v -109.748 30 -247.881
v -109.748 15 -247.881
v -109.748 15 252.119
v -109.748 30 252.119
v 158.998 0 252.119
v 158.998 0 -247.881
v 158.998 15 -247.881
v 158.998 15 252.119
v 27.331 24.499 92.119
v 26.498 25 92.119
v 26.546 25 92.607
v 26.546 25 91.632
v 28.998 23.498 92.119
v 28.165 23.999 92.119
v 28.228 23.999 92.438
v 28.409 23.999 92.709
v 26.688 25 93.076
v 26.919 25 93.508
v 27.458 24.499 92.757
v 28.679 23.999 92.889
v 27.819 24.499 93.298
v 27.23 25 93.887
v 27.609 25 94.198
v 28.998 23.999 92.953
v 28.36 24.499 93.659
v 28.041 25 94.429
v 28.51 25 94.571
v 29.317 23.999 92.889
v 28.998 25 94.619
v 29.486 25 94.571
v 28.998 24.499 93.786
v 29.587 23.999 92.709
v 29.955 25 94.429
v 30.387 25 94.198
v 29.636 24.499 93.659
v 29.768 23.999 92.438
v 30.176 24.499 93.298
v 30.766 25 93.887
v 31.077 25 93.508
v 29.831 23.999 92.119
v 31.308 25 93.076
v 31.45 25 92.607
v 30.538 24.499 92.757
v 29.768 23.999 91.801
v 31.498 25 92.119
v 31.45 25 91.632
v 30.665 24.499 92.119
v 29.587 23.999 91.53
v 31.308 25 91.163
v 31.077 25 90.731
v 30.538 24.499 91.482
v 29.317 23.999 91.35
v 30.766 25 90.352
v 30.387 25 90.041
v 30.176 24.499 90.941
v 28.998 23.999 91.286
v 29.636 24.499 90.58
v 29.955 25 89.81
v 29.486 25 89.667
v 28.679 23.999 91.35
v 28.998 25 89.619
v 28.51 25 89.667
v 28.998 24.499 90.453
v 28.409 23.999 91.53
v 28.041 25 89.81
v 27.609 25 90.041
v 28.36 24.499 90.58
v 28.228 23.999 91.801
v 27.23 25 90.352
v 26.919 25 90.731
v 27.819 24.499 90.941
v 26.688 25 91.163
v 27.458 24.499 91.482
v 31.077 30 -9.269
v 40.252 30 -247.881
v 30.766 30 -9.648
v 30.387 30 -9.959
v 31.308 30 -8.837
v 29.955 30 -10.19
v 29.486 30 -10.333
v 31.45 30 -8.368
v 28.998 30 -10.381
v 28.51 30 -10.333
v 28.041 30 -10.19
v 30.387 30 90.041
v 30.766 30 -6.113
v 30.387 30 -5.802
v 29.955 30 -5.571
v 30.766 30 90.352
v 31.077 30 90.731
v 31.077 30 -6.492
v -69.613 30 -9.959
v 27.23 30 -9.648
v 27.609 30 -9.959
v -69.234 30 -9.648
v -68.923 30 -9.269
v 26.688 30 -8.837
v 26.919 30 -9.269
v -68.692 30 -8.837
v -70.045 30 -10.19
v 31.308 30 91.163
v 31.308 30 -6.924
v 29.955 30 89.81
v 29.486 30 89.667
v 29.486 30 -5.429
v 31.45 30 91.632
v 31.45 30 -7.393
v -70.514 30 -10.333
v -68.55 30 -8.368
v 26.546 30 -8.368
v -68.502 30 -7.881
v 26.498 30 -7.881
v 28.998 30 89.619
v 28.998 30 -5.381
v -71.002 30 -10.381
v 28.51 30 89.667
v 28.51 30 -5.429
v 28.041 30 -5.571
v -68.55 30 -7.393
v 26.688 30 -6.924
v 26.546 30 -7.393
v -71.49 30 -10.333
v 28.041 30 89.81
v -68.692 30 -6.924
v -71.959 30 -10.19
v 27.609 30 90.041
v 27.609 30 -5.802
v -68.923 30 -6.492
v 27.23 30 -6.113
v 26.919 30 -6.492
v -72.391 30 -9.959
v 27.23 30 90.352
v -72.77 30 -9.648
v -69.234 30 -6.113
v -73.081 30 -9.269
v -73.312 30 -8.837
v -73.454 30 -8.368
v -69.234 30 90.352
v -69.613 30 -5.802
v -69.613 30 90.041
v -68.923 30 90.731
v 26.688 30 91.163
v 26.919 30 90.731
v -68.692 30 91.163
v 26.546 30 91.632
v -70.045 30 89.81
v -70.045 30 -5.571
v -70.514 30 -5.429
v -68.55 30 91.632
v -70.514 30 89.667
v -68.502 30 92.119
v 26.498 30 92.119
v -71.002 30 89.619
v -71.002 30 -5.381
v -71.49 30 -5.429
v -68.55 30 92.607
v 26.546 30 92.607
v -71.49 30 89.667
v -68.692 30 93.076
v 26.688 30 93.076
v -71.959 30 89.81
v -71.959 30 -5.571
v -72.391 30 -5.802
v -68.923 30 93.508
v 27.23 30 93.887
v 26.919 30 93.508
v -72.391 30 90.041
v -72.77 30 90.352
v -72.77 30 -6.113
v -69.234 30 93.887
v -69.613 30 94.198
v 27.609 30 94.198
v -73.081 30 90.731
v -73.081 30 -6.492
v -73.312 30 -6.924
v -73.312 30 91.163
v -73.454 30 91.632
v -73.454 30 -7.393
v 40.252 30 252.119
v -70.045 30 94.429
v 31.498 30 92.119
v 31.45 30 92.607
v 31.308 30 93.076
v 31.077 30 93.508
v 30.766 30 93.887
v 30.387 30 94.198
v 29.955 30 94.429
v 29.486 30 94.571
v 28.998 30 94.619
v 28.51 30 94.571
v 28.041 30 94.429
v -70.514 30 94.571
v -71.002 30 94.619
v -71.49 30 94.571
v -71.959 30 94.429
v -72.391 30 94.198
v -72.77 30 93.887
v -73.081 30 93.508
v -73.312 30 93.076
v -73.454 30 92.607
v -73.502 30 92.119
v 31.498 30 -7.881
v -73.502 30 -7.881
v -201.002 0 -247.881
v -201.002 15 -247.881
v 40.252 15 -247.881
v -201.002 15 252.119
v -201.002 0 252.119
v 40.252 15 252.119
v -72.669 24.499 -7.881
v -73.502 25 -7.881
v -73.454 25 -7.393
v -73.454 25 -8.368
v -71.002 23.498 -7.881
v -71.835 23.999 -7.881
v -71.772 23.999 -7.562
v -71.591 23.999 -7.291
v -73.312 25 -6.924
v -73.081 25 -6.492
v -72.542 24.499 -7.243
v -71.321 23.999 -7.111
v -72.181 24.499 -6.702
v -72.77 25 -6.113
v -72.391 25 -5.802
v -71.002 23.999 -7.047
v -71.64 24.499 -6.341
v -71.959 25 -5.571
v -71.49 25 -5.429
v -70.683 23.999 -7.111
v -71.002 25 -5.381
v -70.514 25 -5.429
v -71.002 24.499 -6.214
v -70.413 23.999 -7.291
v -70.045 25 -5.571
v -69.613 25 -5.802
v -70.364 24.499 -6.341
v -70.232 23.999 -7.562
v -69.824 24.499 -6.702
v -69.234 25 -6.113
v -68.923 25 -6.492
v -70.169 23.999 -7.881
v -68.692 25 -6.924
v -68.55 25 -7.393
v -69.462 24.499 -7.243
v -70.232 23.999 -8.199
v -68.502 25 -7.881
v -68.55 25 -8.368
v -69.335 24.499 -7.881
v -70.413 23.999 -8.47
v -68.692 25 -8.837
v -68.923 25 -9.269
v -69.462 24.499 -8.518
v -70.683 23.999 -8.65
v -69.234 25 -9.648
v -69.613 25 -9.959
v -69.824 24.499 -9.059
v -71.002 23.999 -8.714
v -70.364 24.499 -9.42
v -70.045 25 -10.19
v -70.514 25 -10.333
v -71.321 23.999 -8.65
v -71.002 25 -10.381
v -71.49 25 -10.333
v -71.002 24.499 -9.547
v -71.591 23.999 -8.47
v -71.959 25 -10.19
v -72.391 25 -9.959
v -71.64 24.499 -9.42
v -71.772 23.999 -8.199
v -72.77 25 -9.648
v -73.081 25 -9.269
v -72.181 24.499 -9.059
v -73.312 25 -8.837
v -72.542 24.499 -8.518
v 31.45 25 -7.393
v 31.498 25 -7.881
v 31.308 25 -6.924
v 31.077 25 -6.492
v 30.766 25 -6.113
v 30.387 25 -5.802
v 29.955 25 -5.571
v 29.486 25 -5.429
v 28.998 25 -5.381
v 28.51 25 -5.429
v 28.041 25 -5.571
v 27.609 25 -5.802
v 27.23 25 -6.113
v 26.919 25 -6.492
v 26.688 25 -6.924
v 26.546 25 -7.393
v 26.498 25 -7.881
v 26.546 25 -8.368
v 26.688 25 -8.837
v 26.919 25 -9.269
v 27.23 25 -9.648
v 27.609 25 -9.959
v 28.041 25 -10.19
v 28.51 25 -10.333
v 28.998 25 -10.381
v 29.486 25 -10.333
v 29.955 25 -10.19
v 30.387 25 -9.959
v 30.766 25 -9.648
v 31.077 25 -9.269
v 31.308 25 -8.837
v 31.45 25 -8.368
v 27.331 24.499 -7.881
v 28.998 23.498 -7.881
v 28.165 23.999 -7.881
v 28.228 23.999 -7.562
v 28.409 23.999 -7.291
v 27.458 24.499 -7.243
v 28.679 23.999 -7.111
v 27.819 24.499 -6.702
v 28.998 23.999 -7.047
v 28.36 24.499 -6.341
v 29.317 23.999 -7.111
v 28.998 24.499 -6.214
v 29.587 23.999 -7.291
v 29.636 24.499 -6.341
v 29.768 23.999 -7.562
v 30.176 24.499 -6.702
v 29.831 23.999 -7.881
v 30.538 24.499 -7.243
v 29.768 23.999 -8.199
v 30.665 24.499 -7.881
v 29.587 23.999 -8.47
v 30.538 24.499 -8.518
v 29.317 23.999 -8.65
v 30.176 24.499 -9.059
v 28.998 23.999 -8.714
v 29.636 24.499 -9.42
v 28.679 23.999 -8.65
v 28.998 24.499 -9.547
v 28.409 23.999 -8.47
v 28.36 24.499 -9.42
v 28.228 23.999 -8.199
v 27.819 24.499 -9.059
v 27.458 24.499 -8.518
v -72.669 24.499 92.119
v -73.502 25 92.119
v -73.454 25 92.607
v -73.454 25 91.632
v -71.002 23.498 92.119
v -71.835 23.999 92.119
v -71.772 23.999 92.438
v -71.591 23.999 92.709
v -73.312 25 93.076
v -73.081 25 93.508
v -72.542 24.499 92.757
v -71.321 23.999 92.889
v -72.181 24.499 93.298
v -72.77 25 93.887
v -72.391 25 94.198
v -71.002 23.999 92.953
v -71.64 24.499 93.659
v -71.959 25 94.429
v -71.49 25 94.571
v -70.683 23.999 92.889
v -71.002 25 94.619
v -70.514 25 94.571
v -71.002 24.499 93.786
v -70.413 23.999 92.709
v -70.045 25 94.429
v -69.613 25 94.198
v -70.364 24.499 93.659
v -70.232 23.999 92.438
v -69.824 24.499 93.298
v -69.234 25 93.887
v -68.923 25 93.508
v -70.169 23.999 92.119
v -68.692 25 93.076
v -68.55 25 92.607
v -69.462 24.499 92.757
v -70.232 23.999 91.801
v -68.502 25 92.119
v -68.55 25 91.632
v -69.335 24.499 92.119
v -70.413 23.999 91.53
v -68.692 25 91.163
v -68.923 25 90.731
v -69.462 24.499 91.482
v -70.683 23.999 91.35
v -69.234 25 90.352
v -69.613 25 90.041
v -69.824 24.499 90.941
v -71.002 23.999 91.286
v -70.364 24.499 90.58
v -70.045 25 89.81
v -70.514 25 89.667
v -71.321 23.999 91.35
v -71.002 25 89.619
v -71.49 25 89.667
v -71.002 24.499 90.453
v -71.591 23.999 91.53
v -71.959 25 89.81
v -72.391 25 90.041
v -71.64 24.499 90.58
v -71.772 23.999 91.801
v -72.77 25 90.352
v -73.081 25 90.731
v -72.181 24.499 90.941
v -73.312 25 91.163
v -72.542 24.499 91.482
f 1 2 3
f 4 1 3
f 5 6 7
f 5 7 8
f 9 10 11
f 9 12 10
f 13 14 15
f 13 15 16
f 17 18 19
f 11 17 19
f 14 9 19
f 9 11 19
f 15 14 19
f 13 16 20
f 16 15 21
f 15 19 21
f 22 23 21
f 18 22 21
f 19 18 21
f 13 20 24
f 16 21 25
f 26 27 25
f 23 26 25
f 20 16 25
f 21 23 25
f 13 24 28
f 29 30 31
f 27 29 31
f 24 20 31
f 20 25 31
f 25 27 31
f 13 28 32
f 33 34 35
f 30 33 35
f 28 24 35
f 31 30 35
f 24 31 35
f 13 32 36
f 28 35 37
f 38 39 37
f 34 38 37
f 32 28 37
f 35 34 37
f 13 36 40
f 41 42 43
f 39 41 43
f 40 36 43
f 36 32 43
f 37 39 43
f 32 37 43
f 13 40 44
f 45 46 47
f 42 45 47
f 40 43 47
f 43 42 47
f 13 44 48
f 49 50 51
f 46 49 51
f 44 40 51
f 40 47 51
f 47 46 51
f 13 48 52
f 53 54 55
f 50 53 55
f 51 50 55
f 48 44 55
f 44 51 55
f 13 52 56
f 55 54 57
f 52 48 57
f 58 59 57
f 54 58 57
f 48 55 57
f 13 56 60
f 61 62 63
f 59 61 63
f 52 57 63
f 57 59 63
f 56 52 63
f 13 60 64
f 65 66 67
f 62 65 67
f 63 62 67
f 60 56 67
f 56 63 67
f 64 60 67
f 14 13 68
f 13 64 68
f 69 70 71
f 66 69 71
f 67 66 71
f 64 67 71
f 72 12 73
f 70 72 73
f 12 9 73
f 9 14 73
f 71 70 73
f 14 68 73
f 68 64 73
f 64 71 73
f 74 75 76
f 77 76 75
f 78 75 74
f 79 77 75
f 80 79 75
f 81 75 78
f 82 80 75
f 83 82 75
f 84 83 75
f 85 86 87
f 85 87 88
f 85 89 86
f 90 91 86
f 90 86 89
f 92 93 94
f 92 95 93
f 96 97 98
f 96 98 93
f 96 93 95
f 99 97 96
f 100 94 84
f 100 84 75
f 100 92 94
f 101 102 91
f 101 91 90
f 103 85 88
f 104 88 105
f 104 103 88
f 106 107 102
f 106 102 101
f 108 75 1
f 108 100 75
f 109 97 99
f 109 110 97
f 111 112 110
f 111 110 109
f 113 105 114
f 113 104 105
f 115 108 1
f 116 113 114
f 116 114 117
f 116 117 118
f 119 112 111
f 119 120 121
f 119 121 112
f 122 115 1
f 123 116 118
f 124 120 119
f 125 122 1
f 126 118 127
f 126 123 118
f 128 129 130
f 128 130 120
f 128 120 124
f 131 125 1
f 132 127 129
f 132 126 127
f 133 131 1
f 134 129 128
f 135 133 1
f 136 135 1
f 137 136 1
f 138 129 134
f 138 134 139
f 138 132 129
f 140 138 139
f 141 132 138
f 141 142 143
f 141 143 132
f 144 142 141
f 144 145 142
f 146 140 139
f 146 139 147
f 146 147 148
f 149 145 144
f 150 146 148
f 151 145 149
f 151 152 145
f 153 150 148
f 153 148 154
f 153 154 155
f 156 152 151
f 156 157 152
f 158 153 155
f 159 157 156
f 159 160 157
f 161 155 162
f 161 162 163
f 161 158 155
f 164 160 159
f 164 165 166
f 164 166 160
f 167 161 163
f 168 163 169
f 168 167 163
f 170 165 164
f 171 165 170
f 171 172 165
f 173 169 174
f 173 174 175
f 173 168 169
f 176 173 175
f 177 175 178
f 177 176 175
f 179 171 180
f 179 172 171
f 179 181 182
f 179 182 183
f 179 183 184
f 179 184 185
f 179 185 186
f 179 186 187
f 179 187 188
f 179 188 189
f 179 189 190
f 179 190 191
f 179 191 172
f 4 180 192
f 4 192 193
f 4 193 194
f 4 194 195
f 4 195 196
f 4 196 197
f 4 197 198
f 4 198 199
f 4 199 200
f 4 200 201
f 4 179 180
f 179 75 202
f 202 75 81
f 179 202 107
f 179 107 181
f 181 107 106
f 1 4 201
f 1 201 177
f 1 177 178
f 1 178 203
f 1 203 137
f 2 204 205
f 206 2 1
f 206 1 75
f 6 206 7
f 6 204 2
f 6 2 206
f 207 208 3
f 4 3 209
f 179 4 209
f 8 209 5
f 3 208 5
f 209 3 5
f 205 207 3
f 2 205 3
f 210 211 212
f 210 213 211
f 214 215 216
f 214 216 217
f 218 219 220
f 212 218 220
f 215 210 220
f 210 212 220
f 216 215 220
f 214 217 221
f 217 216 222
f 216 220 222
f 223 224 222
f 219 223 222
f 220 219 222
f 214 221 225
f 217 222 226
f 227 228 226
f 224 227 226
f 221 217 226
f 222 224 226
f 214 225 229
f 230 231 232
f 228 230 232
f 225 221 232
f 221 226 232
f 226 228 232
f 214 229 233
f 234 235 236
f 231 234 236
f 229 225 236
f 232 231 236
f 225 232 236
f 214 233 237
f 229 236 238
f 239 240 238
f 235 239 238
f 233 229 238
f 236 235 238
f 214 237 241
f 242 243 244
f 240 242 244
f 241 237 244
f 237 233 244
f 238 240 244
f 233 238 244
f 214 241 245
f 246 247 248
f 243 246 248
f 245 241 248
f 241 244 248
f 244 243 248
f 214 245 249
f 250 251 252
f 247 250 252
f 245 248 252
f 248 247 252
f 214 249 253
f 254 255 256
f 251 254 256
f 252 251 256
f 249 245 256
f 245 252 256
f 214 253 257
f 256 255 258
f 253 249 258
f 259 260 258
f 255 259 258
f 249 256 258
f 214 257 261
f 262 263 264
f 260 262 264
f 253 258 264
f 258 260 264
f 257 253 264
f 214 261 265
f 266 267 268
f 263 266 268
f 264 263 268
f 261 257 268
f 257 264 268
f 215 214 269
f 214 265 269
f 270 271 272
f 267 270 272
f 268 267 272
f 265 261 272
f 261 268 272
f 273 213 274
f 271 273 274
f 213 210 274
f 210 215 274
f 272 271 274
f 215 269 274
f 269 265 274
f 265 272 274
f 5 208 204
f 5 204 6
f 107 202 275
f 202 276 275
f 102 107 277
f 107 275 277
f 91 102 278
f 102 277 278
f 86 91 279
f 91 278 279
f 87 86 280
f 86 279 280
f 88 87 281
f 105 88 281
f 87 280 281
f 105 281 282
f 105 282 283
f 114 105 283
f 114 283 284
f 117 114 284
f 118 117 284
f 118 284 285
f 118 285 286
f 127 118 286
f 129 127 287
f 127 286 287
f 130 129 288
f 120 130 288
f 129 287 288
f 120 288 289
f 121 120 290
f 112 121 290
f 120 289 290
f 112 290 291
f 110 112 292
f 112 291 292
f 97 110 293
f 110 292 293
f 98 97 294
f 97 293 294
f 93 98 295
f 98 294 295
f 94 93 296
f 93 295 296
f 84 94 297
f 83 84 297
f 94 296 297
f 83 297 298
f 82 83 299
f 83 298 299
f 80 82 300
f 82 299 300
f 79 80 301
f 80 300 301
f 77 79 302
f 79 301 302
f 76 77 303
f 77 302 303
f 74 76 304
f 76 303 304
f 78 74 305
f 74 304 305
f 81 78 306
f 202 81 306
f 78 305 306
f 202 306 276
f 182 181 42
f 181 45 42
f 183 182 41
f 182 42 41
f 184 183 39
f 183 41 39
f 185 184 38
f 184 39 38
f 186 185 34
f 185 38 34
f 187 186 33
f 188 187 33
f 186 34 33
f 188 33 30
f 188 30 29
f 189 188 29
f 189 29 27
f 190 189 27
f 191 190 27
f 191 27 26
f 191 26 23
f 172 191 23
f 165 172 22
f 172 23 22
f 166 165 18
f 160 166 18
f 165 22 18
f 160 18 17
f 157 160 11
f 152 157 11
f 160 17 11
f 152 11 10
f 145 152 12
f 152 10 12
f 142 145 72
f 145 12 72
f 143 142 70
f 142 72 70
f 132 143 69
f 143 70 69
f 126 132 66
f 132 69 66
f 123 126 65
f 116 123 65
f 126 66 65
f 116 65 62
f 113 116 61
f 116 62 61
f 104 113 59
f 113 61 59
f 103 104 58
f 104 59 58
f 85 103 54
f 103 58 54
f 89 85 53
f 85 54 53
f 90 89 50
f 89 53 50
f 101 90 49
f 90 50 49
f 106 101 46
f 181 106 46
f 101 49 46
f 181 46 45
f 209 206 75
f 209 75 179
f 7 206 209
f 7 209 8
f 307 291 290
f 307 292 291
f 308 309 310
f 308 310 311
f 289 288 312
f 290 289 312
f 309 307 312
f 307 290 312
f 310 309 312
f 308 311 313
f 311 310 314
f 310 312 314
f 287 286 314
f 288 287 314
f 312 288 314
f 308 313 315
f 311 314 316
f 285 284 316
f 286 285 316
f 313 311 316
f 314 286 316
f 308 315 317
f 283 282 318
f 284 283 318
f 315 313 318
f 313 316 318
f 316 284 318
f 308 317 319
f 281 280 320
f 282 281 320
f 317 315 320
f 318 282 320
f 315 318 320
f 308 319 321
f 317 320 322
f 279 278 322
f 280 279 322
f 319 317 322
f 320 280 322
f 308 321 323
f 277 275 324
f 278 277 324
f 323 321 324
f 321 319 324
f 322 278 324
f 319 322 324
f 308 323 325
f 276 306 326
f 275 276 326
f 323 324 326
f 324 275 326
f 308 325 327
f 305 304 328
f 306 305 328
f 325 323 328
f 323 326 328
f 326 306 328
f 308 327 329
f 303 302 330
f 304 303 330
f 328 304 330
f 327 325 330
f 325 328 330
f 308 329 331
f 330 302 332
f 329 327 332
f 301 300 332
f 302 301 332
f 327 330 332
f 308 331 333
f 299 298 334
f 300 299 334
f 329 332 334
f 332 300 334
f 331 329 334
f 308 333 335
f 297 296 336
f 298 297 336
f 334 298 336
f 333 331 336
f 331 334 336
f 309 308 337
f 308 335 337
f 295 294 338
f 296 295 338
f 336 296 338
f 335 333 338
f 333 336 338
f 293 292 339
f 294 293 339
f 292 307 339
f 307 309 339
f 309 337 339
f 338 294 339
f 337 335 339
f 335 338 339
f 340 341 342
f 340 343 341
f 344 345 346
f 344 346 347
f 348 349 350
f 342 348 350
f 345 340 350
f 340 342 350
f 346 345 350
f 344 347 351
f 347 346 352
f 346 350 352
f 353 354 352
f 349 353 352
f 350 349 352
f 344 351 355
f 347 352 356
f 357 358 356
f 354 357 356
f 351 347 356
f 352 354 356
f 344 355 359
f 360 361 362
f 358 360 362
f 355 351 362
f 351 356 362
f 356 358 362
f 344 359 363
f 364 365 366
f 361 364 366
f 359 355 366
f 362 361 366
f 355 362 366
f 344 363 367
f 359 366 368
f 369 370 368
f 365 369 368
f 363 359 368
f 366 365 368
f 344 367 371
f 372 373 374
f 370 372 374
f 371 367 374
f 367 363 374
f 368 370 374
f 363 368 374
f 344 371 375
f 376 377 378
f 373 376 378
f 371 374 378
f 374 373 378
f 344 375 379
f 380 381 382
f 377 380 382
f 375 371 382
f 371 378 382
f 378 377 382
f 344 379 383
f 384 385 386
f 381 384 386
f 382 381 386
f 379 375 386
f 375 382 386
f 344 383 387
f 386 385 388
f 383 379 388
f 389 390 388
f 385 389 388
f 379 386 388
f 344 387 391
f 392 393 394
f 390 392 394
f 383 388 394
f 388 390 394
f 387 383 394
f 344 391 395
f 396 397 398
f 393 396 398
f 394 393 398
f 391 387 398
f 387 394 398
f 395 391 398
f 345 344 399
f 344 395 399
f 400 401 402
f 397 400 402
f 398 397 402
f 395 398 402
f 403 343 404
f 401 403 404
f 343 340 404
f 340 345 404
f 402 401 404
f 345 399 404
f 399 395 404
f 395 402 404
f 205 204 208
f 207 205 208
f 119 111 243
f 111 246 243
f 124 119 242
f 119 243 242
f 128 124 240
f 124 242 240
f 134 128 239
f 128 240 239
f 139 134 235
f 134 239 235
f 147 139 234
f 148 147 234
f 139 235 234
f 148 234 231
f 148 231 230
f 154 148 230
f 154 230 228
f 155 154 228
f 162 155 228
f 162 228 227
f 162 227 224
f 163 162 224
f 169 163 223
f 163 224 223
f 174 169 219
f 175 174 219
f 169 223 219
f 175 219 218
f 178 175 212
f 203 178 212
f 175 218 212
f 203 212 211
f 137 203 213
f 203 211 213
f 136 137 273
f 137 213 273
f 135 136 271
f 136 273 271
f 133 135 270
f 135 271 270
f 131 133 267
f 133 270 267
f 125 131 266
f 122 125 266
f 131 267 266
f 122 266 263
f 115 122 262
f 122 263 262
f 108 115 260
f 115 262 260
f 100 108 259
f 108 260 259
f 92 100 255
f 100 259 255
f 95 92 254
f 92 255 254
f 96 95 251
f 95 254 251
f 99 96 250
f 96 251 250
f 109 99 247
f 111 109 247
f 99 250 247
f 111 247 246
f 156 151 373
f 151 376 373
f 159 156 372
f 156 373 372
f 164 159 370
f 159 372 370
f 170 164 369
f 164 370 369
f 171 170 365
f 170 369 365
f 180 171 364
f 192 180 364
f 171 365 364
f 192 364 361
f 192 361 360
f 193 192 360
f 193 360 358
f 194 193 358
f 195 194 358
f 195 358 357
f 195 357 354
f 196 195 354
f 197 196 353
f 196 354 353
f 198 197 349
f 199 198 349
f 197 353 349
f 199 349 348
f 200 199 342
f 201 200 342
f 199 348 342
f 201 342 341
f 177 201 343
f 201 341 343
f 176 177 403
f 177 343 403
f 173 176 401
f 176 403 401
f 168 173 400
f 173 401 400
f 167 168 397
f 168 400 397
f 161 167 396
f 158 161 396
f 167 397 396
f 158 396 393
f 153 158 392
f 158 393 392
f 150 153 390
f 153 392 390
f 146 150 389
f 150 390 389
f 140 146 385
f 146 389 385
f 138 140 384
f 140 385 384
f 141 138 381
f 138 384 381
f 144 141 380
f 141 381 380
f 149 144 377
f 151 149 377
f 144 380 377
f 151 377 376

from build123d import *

# Parameters (mm, degrees)
F0_W     = 360
F0_H     = 500
F1_DEPTH = 15
F2_W     = 150
F2_H     = 500
F3_DEPTH = 15
F5_D     = 5
F5_DEPTH = 5
F5_TIP   = 1.5021515476


with BuildPart() as f1:
    # F0 (on Front) → F1 (new body)
    with BuildSketch(Plane.XZ):
        with Locations((-21.0021212956, 2.1194461733)):
            Rectangle(F0_W, F0_H)
    extrude(amount=-F1_DEPTH)

    # F2 (on face) → F3 (join)
    with BuildSketch(Plane(origin=(0, 15, 0), x_dir=(-1, 0, 0), z_dir=(0, 1, 0))):
        with Locations((34.7477533389, 2.1194461733)):
            Rectangle(F2_W, F2_H)
    extrude(amount=F3_DEPTH)

    # F5
    with Locations(Plane(origin=(0, 30, 0), x_dir=(-1, 0, 0), z_dir=(0, 1, 0))):
        with Locations((-28.9978787044, 92.1194461733), (71.0021212956, 92.1194461733), (71.0021212956, -7.8805538267), (-28.9978787044, -7.8805538267)):
            Hole(F5_D / 2, depth=F5_DEPTH)
            with Locations((0, 0, -(F5_DEPTH + F5_TIP / 2))):  # 118° drill point
                Cone(0, F5_D / 2, F5_TIP, mode=Mode.SUBTRACT)


solid = f1.part
